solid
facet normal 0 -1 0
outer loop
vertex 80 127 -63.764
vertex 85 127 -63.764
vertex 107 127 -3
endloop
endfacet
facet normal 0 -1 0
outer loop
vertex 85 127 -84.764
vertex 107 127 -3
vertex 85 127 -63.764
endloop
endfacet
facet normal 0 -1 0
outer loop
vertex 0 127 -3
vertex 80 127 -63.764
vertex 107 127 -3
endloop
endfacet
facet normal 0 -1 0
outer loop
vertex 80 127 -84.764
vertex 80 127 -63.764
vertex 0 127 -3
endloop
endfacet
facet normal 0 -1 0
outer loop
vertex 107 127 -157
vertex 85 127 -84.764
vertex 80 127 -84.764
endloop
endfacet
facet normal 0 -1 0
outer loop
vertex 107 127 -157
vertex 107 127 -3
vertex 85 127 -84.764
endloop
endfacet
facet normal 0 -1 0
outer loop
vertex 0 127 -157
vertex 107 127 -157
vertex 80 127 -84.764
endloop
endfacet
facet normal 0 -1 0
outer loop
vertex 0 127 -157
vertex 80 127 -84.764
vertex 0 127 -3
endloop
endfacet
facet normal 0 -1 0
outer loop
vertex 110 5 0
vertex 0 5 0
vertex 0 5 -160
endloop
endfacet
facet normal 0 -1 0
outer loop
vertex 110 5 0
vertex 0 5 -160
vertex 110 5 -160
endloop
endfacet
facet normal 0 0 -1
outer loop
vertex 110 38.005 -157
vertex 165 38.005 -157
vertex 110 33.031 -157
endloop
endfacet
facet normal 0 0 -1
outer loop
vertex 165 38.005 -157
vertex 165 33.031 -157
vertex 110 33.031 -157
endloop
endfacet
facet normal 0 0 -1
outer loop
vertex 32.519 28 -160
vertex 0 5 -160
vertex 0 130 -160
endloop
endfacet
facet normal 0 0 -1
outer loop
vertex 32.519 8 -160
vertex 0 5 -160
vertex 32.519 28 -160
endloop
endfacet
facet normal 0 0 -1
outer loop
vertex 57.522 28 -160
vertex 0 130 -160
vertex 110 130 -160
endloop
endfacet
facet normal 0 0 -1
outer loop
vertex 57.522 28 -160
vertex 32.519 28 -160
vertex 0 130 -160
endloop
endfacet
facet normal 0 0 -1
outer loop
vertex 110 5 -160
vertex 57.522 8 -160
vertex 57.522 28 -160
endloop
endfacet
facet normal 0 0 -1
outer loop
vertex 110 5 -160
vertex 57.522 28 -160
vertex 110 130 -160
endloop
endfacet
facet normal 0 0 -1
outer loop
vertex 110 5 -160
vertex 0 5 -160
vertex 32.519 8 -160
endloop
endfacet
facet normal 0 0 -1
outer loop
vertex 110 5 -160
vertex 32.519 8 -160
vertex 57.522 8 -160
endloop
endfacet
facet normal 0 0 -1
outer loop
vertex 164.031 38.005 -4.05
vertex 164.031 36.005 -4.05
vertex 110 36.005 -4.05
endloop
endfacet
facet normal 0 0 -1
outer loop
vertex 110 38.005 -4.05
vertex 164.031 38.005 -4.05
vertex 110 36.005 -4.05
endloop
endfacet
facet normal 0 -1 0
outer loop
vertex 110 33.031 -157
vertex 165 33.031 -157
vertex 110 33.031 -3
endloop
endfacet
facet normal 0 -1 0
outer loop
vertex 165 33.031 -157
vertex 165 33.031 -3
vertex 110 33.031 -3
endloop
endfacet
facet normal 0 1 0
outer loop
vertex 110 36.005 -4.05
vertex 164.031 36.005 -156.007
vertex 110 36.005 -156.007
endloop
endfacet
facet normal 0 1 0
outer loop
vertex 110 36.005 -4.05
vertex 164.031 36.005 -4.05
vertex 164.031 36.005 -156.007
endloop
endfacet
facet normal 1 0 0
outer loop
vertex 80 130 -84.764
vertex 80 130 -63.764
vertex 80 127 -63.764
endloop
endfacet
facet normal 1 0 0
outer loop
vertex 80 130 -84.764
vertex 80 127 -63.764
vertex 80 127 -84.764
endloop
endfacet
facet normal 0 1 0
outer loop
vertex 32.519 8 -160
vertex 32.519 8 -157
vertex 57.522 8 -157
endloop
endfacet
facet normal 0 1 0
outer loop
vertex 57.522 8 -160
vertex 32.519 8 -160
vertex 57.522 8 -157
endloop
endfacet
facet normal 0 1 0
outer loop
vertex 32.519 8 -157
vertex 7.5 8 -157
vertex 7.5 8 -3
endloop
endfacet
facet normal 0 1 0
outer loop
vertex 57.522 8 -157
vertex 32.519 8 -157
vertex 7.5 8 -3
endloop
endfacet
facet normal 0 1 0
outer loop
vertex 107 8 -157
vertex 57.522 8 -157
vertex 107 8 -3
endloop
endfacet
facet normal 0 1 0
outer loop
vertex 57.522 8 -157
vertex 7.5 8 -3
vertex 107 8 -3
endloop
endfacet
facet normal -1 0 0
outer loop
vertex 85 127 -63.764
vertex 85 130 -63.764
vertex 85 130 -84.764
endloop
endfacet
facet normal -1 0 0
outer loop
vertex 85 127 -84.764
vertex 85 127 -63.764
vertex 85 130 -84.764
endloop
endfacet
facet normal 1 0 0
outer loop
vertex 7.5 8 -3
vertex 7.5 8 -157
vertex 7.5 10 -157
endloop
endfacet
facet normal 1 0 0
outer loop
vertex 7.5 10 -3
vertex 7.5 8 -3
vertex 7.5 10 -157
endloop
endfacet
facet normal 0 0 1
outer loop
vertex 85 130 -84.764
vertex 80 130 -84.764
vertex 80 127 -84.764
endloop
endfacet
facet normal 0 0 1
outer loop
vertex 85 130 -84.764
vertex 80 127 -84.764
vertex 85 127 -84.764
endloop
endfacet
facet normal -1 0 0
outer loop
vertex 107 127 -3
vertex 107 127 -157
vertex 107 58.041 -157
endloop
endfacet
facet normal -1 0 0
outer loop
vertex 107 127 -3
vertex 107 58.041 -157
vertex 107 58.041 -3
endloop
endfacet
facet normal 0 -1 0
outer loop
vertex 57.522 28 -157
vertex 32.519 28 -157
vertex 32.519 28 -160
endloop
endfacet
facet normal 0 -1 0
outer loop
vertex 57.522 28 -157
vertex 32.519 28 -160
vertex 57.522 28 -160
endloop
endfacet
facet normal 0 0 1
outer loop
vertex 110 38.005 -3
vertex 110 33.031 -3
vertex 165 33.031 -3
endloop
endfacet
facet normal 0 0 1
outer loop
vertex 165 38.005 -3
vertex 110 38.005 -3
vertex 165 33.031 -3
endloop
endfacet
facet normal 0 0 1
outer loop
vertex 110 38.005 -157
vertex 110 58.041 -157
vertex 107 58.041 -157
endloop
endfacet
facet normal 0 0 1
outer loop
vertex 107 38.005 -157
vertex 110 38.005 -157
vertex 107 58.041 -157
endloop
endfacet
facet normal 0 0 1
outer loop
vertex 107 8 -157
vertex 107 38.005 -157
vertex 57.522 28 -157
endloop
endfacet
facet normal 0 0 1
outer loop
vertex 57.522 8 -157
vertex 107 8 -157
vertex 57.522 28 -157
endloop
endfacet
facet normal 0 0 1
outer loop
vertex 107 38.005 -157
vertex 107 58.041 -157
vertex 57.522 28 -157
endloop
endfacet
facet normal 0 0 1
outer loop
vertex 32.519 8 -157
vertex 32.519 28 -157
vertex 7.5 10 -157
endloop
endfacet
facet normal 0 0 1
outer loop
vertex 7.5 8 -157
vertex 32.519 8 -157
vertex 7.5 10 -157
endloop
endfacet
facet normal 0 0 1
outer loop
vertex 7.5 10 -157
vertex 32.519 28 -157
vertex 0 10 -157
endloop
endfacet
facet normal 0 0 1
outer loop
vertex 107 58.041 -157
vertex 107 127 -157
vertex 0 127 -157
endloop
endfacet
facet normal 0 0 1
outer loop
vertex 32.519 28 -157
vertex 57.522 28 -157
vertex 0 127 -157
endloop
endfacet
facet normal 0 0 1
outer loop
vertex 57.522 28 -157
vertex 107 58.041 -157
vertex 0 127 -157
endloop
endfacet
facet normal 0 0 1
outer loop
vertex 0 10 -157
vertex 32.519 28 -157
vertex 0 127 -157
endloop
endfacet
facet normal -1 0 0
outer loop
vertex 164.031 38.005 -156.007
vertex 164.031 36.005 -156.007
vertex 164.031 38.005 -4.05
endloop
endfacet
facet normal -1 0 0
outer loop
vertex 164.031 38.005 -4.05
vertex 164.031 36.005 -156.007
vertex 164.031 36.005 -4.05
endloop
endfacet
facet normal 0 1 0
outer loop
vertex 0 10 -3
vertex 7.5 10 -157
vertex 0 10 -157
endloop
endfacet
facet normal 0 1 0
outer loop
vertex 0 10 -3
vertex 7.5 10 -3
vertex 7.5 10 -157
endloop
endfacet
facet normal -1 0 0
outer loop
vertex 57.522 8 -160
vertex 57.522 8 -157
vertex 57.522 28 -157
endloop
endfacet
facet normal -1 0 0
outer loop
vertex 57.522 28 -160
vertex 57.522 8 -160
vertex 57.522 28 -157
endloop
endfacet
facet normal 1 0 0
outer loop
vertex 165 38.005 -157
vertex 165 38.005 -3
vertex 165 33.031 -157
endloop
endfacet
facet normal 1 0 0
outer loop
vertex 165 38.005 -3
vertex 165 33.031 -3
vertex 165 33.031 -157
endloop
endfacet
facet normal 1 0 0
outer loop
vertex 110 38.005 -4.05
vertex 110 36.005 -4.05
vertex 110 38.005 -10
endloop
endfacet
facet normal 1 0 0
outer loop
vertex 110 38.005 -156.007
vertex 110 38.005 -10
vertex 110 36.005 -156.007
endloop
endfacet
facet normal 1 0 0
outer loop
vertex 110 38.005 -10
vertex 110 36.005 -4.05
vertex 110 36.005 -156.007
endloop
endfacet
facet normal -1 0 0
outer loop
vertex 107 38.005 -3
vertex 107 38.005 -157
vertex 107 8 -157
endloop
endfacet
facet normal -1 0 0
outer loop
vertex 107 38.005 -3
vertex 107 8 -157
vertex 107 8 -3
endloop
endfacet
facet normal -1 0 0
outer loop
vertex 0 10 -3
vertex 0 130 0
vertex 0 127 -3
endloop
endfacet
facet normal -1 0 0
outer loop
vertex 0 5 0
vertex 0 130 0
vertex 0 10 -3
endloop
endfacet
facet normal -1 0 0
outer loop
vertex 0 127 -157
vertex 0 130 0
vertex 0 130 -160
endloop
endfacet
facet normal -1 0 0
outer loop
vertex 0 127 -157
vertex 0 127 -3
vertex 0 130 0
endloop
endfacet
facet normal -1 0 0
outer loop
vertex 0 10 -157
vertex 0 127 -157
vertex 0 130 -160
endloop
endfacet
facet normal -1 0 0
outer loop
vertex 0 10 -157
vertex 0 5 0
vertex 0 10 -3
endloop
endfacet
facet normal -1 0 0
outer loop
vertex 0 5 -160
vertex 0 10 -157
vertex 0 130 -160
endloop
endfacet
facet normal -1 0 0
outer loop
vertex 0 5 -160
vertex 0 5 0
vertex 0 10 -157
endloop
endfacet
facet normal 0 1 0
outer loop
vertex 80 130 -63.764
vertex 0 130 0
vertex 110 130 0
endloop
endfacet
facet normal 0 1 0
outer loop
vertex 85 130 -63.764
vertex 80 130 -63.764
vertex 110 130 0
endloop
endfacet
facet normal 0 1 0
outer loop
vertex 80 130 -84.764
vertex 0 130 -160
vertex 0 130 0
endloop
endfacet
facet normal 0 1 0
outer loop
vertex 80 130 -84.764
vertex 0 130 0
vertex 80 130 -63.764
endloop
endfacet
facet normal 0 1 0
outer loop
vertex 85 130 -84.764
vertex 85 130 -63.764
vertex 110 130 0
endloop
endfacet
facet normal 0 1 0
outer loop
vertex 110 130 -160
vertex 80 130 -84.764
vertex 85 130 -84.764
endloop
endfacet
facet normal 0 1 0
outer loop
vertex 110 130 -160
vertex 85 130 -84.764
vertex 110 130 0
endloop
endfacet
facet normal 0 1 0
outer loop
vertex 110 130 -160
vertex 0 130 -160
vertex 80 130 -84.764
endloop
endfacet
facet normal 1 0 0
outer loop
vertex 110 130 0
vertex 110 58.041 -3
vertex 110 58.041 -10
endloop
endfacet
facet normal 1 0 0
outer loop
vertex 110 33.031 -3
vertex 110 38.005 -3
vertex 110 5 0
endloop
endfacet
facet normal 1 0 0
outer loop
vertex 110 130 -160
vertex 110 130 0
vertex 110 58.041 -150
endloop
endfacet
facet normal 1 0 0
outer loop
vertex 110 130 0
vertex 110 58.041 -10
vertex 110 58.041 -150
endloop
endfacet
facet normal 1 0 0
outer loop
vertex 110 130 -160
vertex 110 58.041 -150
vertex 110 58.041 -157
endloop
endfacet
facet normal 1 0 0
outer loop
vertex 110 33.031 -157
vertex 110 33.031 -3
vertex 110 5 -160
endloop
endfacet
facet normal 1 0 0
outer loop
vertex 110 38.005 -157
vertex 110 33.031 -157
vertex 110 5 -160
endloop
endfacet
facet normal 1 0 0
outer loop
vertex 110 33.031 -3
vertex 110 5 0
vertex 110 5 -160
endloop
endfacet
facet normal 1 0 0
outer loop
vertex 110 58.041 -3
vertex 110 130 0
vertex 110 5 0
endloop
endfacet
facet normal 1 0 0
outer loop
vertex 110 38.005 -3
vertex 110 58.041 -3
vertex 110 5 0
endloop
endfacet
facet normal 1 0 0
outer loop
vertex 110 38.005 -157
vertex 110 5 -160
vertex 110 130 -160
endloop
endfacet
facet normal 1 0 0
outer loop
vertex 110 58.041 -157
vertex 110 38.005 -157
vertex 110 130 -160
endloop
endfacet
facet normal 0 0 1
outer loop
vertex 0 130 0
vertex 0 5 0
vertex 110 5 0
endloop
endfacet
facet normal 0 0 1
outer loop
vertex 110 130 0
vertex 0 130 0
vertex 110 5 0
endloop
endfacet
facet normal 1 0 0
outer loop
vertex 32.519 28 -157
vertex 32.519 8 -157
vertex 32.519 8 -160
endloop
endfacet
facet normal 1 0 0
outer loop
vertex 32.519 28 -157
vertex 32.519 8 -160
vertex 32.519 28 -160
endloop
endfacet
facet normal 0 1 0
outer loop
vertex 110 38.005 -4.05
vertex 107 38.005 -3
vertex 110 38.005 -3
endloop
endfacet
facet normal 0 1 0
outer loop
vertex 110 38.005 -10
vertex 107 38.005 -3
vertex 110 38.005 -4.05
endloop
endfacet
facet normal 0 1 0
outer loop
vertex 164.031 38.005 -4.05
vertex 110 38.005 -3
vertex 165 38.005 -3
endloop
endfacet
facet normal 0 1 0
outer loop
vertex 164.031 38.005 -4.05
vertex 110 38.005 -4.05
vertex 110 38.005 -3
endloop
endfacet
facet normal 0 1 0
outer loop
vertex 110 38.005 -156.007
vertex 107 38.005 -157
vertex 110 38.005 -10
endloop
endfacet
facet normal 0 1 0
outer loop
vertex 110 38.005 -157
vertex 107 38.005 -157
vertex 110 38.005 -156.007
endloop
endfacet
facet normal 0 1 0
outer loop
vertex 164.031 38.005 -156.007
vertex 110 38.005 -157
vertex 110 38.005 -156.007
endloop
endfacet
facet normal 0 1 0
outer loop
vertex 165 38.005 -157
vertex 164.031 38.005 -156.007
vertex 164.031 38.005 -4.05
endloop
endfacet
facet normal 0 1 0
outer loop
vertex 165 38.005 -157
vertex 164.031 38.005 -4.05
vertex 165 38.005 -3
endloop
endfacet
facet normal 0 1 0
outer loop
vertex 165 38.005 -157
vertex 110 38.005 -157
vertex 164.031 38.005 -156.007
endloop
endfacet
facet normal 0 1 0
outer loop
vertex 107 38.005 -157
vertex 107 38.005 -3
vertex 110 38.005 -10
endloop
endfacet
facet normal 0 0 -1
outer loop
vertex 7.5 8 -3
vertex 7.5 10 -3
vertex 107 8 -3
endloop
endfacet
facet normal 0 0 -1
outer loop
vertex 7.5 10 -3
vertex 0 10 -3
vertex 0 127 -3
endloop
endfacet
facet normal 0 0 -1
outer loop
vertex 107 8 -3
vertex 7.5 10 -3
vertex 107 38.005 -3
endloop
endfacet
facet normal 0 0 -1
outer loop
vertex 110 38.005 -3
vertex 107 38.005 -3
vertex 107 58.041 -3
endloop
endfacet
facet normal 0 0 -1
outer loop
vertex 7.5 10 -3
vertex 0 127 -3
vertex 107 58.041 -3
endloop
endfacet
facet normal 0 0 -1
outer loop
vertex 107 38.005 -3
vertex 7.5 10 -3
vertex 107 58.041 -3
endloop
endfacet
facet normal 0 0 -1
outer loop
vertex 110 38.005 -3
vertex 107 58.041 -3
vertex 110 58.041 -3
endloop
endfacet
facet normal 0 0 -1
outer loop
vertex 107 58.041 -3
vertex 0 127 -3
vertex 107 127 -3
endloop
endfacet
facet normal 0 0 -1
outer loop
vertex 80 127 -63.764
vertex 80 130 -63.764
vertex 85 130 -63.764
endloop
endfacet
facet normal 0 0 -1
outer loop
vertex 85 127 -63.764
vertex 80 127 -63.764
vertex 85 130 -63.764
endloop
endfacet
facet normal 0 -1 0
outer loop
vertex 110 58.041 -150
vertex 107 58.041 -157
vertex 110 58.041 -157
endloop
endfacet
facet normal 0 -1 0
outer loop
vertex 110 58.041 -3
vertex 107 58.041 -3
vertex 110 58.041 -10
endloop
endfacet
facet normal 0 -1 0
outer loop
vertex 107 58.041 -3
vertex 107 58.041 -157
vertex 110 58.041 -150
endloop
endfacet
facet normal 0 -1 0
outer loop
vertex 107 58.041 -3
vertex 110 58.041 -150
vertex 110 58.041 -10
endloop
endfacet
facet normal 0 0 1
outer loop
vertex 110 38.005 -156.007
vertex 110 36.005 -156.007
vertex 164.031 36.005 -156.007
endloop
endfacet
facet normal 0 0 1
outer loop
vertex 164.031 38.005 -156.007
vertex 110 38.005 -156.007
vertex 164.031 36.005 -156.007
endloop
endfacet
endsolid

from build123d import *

# Parameters (mm, degrees)
ESBO_O1_W                   = 110
ESBO_O1_H                   = 160
RESSALTO_EXTRUS_O1_DEPTH    = 10
ESBO_O2_W                   = 95
ESBO_O2_H                   = 140
CORTE_EXTRUS_O1_DEPTH       = 2
RESSALTO_EXTRUS_O2_DEPTH    = 110
ESBO_O6_W                   = 25.003576957
ESBO_O6_H                   = 20
CORTE_EXTRUS_O2_DEPTH       = 10
ESBO_O7_W                   = 140
ESBO_O7_H                   = 20.035722947
SAIDAPRAFIOSSENSORES_DEPTH  = 30
ESBO_O8_W                   = 140
ESBO_O8_H                   = 9.973523328
SUPORTE_PARA_SENSORES_DEPTH = 55
ESBO_O9_W                   = 55
ESBO_O9_H                   = 140
CORTE_EXTRUS_O4_DEPTH       = 2
ESBO_O5_W                   = 110
ESBO_O5_H                   = 160
RESSALTO_EXTRUS_O3_DEPTH    = 10
ESBO_O11_W                  = 5
ESBO_O11_H                  = 21
CORTE_EXTRUS_O5_DEPTH       = 9
ESBO_O12_W                  = 102.5
ESBO_O12_H                  = 140
CORTE_EXTRUS_O6_DEPTH       = 7
CORTE_EXTRUS_O7_DEPTH       = 7
CORTE_EXTRUS_O8_DEPTH       = 7
ESBO_O15_W                  = 110
ESBO_O15_H                  = 160
CORTE_EXTRUS_O9_DEPTH       = 5
ESBO_O16_W                  = 154
ESBO_O16_H                  = 119
CORTE_EXTRUS_O10_DEPTH      = 4.5
ESBO_O17_W                  = 55
ESBO_O17_H                  = 140
CORTE_EXTRUS_O11_DEPTH      = 5
ESBO_O18_W                  = 55
ESBO_O18_H                  = 2.973523328
RESSALTO_EXTRUS_O4_DEPTH    = 7
ESBO_O19_W                  = 55
ESBO_O19_H                  = 2.973523328
RESSALTO_EXTRUS_O5_DEPTH    = 7
RESSALTO_EXTRUS_O6_DEPTH    = 2


with BuildPart() as part:
    # Esboço1 → Ressalto-extrusão1 (new body)
    with BuildSketch(Plane(origin=(0, 0, 0), x_dir=(1, 0, 0), z_dir=(0, 1, 0))):
        with Locations((55, 80)):
            Rectangle(ESBO_O1_W, ESBO_O1_H)
    extrude(amount=RESSALTO_EXTRUS_O1_DEPTH)

    # Esboço2 → Corte-extrusão1 (cut)
    with BuildSketch(Plane(origin=(0, 10, 0), x_dir=(1, 0, 0), z_dir=(0, 1, 0))):
        with Locations((55, 80)):
            Rectangle(ESBO_O2_W, ESBO_O2_H)
    extrude(amount=-CORTE_EXTRUS_O1_DEPTH, mode=Mode.SUBTRACT)

    # Esboço4 → Ressalto-extrusão2 (add)
    with BuildSketch(Plane(origin=(0, 10, 0), x_dir=(1, 0, 0), z_dir=(0, 1, 0))):
        Polygon((0, 160), (0, 150), (102.5, 150), (102.5, 10), (0, 10), (0, 0), (110, 0), (110, 160), align=None)
    extrude(amount=RESSALTO_EXTRUS_O2_DEPTH)

    # Esboço6 → Corte-extrusão2 (cut)
    with BuildSketch(Plane.XY.offset(-150)):
        with Locations((45.020695382, 18)):
            Rectangle(ESBO_O6_W, ESBO_O6_H)
    extrude(amount=-CORTE_EXTRUS_O2_DEPTH, mode=Mode.SUBTRACT)

    # Esboço7 → Saidaprafiossensores (cut)
    with BuildSketch(Plane.ZY.offset(-102.5)):
        with Locations((-80, 48.022769051)):
            Rectangle(ESBO_O7_W, ESBO_O7_H)
    extrude(amount=-SAIDAPRAFIOSSENSORES_DEPTH, mode=Mode.SUBTRACT)

    # Esboço8 → Suporte para sensores (add)
    with BuildSketch(Plane(origin=(110, 0, 0), x_dir=(0, 0, -1), z_dir=(1, 0, 0))):
        with Locations((80, 33.018145913)):
            Rectangle(ESBO_O8_W, ESBO_O8_H)
    extrude(amount=SUPORTE_PARA_SENSORES_DEPTH)

    # Esboço9 → Corte-extrusão4 (cut)
    with BuildSketch(Plane(origin=(0, 38.004907577, 0), x_dir=(1, 0, 0), z_dir=(0, 1, 0))):
        with Locations((137.5, 80)):
            Rectangle(ESBO_O9_W, ESBO_O9_H)
    extrude(amount=-CORTE_EXTRUS_O4_DEPTH, mode=Mode.SUBTRACT)

    # Esboço5 → Ressalto-extrusão3 (add)
    with BuildSketch(Plane(origin=(0, 120, 0), x_dir=(1, 0, 0), z_dir=(0, 1, 0))):
        with Locations((55, 80)):
            Rectangle(ESBO_O5_W, ESBO_O5_H)
    extrude(amount=RESSALTO_EXTRUS_O3_DEPTH)

    # Esboço11 → Corte-extrusão5 (cut)
    with BuildSketch(Plane(origin=(0, 130, 0), x_dir=(1, 0, 0), z_dir=(0, 1, 0))):
        with Locations((82.5, 74.263561318)):
            Rectangle(ESBO_O11_W, ESBO_O11_H)
    extrude(amount=-CORTE_EXTRUS_O5_DEPTH, mode=Mode.SUBTRACT)

    # Esboço12 → Corte-extrusão6 (cut)
    with BuildSketch(Plane.XZ.offset(-120)):
        with Locations((51.25, -80)):
            Rectangle(ESBO_O12_W, ESBO_O12_H)
    extrude(amount=-CORTE_EXTRUS_O6_DEPTH, mode=Mode.SUBTRACT)

    # Esboço13 → Corte-extrusão7 (cut)
    with BuildSketch(Plane.XY.offset(-150)):
        Polygon((7.5, 8), (7.5, 10), (0, 10), (0, 127), (102.5, 127), (102.5, 58.040630524), (110, 58.040630524), (110, 38.004907577), (102.5, 38.004907577), (102.5, 8), align=None)
    extrude(amount=-CORTE_EXTRUS_O7_DEPTH, mode=Mode.SUBTRACT)

    # Esboço14 → Corte-extrusão8 (cut)
    with BuildSketch(Plane(origin=(0, 0, -10), x_dir=(-1, 0, 0), z_dir=(0, 0, -1))):
        Polygon((-102.5, 127), (0, 127), (0, 10), (-7.5, 10), (-7.5, 8), (-102.5, 8), (-102.5, 38.004907577), (-110, 38.004907577), (-110, 58.040630524), (-102.5, 58.040630524), align=None)
    extrude(amount=-CORTE_EXTRUS_O8_DEPTH, mode=Mode.SUBTRACT)

    # Esboço15 → Corte-extrusão9 (cut)
    with BuildSketch(Plane.XZ):
        with Locations((55, -80)):
            Rectangle(ESBO_O15_W, ESBO_O15_H)
    extrude(amount=-CORTE_EXTRUS_O9_DEPTH, mode=Mode.SUBTRACT)

    # Esboço16 → Corte-extrusão10 (cut)
    with BuildSketch(Plane.ZY.offset(-102.5)):
        with Locations((-80, 67.5)):
            Rectangle(ESBO_O16_W, ESBO_O16_H)
    extrude(amount=-CORTE_EXTRUS_O10_DEPTH, mode=Mode.SUBTRACT)

    # Esboço17 → Corte-extrusão11 (cut)
    with BuildSketch(Plane.XZ.offset(-28.031384249)):
        with Locations((137.5, -80)):
            Rectangle(ESBO_O17_W, ESBO_O17_H)
    extrude(amount=-CORTE_EXTRUS_O11_DEPTH, mode=Mode.SUBTRACT)

    # Esboço18 → Ressalto-extrusão4 (add)
    with BuildSketch(Plane.XY.offset(-10)):
        with Locations((137.5, 34.518145913)):
            Rectangle(ESBO_O18_W, ESBO_O18_H)
    extrude(amount=RESSALTO_EXTRUS_O4_DEPTH)

    # Esboço19 → Ressalto-extrusão5 (add)
    with BuildSketch(Plane(origin=(0, 0, -150), x_dir=(-1, 0, 0), z_dir=(0, 0, -1))):
        with Locations((-137.5, 34.518145913)):
            Rectangle(ESBO_O19_W, ESBO_O19_H)
    extrude(amount=RESSALTO_EXTRUS_O5_DEPTH)

    # Esboço20 → Ressalto-extrusão6 (add)
    with BuildSketch(Plane(origin=(0, 36.004907577, 0), x_dir=(1, 0, 0), z_dir=(0, 1, 0))):
        Polygon((110, 157), (110, 156.007066328), (164.030852529, 156.007066328), (164.030852529, 4.050019812), (110, 4.050019812), (110, 3), (165, 3), (165, 157), align=None)
    extrude(amount=RESSALTO_EXTRUS_O6_DEPTH)


solid = part.part
